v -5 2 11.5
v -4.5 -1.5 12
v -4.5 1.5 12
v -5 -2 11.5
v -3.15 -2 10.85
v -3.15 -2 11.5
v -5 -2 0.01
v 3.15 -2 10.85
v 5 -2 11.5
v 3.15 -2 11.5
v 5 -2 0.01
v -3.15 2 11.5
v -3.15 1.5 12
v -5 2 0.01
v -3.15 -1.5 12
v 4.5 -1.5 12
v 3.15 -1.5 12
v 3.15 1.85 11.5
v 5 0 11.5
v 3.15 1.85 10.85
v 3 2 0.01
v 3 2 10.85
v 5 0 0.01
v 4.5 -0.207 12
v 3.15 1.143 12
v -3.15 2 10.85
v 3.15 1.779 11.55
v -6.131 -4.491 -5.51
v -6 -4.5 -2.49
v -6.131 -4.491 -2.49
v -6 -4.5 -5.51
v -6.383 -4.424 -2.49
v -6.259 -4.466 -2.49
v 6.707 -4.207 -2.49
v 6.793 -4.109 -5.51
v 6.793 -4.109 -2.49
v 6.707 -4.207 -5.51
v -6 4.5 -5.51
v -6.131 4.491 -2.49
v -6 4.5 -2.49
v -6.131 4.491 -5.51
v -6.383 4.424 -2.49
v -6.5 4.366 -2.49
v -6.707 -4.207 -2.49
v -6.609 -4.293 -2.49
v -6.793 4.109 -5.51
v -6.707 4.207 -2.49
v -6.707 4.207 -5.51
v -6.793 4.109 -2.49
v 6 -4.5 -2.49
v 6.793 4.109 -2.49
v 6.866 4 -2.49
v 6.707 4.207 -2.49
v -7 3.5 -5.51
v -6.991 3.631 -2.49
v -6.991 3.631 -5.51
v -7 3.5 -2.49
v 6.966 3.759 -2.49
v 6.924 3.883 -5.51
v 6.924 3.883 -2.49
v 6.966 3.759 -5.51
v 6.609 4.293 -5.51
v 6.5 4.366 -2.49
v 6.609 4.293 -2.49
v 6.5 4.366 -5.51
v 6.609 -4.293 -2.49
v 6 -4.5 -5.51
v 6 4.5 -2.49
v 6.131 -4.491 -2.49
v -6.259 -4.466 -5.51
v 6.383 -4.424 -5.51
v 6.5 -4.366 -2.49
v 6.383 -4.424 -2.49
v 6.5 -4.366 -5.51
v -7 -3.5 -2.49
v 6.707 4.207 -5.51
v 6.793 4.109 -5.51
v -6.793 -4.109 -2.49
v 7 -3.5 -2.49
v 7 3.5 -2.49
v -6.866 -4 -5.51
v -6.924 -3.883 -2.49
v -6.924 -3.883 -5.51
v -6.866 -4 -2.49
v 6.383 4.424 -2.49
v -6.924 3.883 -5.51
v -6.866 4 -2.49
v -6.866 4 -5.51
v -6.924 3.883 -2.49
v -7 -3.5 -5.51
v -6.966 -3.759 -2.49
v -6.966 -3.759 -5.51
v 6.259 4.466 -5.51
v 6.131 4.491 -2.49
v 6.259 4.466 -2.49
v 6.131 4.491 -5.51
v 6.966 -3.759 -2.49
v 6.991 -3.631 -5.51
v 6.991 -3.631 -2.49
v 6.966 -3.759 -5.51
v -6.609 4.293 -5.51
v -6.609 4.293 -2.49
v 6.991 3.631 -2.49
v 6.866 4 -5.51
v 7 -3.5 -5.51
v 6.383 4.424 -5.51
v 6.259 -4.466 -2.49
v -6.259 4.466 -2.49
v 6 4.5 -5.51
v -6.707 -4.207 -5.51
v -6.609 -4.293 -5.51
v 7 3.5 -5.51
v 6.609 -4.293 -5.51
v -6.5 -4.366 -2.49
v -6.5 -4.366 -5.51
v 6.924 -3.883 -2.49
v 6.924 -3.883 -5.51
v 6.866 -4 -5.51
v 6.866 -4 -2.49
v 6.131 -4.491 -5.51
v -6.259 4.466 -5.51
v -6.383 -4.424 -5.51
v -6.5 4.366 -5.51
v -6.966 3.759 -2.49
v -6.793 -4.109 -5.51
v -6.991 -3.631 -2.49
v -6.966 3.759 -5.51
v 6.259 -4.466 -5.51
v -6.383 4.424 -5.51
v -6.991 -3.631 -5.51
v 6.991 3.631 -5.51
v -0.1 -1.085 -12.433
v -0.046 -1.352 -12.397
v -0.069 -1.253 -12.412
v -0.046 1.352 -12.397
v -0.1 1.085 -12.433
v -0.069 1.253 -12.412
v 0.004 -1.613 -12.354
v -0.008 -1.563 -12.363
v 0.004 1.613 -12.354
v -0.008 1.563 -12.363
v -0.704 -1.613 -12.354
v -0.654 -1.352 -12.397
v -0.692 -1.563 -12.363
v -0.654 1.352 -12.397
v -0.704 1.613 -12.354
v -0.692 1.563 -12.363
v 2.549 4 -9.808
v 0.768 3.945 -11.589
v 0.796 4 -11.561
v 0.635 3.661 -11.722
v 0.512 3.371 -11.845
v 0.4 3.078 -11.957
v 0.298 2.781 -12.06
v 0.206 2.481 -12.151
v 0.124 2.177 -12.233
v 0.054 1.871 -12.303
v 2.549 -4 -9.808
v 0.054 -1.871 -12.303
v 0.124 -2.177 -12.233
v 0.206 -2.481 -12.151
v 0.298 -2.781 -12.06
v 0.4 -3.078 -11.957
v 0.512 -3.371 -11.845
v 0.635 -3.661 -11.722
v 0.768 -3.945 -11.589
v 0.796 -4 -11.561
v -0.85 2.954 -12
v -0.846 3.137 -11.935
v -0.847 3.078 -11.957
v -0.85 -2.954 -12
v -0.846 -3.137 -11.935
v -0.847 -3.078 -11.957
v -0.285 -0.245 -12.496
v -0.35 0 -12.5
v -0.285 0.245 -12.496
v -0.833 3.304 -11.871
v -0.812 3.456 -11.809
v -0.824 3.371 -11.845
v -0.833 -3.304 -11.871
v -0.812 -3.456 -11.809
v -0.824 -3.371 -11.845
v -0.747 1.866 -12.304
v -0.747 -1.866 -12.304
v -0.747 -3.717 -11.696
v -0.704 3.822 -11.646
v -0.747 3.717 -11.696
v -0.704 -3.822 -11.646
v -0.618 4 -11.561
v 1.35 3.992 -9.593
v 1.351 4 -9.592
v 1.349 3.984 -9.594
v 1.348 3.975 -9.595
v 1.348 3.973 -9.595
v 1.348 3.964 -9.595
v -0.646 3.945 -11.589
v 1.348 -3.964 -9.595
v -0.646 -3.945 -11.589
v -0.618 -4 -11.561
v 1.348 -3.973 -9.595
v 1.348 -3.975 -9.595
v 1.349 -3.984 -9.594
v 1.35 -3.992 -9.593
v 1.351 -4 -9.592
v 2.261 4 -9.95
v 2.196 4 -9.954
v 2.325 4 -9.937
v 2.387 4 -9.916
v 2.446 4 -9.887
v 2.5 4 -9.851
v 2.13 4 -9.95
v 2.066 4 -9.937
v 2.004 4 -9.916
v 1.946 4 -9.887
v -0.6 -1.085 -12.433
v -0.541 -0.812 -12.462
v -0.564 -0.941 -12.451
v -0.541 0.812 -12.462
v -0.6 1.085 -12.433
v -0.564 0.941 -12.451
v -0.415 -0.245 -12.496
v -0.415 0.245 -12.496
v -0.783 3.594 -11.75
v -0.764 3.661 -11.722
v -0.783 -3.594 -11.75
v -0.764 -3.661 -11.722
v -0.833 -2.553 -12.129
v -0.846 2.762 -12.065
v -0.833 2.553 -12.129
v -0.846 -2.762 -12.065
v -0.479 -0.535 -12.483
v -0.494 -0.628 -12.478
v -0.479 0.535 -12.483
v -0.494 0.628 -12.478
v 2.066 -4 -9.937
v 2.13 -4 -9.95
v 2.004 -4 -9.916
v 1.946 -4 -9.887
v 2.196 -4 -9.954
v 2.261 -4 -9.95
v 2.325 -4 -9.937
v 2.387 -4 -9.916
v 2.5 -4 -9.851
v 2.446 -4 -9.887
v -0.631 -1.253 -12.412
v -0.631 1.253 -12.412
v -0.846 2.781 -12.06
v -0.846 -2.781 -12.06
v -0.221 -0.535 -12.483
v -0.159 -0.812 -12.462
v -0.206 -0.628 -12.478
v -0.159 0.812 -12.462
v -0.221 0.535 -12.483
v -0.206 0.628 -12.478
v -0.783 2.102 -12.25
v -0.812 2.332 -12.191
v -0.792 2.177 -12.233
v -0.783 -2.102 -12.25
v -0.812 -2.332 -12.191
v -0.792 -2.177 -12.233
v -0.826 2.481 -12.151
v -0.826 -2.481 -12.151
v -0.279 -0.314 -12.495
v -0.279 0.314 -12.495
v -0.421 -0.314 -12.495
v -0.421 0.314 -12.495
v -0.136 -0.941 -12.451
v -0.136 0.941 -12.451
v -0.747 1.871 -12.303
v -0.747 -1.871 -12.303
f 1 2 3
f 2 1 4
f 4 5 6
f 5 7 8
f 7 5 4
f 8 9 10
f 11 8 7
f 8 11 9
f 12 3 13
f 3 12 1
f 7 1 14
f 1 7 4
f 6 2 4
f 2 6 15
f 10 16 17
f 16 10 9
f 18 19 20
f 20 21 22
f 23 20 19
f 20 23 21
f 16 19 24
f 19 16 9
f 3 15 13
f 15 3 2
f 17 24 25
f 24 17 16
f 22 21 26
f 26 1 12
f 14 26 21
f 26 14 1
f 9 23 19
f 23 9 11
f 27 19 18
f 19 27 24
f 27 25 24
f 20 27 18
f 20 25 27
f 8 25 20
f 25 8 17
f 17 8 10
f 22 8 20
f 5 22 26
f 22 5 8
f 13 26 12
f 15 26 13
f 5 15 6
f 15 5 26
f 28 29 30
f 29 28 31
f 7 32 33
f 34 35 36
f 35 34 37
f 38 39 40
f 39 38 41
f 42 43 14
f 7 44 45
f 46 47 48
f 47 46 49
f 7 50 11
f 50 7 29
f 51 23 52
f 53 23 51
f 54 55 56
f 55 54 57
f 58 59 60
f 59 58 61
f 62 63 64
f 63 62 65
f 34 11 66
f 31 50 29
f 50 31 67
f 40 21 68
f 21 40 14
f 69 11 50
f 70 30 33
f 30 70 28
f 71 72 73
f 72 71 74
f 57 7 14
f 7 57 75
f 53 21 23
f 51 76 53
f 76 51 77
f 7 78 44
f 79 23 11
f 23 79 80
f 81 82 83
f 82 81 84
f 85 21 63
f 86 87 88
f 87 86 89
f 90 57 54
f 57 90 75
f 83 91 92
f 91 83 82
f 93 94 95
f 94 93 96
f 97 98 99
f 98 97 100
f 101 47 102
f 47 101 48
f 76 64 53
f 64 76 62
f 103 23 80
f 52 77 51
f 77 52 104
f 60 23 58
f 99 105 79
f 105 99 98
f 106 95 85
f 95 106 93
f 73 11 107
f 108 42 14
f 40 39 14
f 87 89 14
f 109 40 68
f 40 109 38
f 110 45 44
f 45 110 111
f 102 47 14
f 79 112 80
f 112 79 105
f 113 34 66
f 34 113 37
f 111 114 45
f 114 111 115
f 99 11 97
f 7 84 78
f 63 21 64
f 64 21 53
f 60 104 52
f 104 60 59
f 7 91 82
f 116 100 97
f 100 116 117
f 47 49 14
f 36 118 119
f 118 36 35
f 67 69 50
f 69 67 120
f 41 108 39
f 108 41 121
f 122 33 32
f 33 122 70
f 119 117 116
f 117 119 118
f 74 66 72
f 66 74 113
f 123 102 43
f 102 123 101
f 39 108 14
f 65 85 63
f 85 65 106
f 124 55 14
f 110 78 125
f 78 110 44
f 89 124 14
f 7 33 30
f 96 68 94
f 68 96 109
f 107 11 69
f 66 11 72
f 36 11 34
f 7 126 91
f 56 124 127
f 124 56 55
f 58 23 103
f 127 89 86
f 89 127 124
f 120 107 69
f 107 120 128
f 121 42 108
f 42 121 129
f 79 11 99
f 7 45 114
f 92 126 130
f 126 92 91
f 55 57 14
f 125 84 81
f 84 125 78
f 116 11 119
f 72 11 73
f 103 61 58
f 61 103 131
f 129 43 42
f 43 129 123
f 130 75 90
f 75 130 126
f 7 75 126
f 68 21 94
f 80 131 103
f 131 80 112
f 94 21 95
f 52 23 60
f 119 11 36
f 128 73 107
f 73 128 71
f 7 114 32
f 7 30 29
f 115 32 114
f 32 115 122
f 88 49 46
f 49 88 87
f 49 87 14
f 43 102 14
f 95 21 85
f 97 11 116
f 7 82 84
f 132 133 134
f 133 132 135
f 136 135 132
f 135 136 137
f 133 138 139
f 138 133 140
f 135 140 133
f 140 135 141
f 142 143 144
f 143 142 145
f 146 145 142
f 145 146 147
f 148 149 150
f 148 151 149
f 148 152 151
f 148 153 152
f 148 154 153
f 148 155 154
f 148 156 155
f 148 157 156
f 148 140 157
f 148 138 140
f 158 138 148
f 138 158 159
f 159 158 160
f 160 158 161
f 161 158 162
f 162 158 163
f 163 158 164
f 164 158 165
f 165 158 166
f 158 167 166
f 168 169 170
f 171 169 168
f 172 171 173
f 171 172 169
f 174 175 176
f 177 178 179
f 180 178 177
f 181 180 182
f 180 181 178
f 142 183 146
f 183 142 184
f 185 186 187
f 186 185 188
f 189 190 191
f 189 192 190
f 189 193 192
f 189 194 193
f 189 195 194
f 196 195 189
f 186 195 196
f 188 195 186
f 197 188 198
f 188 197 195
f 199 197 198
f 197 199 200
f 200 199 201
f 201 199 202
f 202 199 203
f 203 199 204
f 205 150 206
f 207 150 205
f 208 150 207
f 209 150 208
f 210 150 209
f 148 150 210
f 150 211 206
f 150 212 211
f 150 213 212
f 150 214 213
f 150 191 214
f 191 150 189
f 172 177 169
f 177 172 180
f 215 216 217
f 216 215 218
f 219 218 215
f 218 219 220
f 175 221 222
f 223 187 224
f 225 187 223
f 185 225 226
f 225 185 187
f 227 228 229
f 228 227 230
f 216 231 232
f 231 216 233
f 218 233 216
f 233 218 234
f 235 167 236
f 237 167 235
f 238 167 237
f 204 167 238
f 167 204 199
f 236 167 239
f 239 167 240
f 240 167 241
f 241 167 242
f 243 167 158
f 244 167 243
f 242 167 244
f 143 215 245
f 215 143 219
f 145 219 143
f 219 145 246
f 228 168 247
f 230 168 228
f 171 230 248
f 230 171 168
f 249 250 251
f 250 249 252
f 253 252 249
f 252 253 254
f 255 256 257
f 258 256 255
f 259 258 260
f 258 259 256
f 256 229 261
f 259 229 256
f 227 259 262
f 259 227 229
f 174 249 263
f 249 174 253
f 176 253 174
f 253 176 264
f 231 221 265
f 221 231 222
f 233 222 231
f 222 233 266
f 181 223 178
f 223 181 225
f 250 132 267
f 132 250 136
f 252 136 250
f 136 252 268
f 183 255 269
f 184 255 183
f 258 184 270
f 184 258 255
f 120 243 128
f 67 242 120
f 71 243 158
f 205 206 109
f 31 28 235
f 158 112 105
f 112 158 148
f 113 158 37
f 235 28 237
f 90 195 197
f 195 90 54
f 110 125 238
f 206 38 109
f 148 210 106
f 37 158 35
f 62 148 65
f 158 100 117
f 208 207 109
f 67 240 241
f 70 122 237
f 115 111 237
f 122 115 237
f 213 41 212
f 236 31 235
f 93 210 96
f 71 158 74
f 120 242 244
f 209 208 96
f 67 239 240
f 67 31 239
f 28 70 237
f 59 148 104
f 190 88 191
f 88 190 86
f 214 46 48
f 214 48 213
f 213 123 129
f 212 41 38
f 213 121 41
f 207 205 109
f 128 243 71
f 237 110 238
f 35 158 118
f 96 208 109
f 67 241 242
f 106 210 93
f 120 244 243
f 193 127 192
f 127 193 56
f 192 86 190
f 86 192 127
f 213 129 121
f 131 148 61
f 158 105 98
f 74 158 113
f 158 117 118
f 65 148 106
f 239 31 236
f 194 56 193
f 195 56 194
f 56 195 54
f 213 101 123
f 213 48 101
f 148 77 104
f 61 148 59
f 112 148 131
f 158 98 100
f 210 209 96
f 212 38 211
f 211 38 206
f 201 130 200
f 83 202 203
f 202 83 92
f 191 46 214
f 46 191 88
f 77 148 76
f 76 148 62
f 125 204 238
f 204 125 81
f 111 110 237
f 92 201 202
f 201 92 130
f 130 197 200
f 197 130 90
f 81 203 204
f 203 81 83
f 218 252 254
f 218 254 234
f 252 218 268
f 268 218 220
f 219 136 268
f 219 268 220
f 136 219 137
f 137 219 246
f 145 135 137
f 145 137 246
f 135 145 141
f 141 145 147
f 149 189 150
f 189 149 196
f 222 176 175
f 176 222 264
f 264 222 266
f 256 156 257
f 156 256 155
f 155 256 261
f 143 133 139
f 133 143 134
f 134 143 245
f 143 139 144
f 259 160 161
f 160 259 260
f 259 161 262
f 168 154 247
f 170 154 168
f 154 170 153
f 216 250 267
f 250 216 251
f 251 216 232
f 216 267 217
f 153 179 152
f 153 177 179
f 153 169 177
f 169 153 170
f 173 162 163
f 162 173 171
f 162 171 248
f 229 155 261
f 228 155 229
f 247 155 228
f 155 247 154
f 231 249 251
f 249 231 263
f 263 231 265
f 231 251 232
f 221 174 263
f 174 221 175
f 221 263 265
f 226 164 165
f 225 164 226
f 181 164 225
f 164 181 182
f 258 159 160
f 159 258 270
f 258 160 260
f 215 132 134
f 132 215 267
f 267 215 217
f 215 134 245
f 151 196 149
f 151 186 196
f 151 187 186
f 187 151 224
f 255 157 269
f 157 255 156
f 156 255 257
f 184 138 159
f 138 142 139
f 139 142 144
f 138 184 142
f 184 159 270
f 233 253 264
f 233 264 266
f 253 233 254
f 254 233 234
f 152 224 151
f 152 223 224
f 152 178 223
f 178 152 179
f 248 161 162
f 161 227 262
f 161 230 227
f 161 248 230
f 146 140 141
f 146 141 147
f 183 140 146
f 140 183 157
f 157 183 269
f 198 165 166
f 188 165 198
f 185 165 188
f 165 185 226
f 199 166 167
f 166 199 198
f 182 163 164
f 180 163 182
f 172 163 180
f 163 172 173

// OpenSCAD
// =====================================================================
//  tip_B45.scad — SP1 tip B45: nail-mimic 45 deg blade, 8 mm edge, R 0.5
//  PROJECT SCRATCH · 05-engineering/cad/tips · units: mm
//  LOADED SENSE +X = plate-first (the 45 deg face faces +X and down); -X = edge-first.
//  Plate 1.0 mm thick (= 2 x R 0.5), crown R 9, edge lowest point z = -12.5.
//  BLADE_MODE = "printed": one-piece PETG print (ON ITS SIDE, model Y vertical,
//               supports under the tang only, 0.10 mm layers);
//               the apex is sanded to R 0.5 and the plan corners to R 1.5.
//  BLADE_MODE = "slot":    carrier only; CA-bond a 1.0 mm nylon/PETG sheet
//               blade (plan-form: 8 x 9 mm, convex R 9 end) onto the 45 deg face.
// =====================================================================
include <tm1_tang_lib.scad>
$fn = TM1_FN;

BLADE_W    = 8.0;        // edge width along Y
BLADE_R    = 0.5;        // edge radius = half plate thickness
ATTACK     = 45;         // plate angle to the scalp plane, deg
DROP       = 7.0;        // band bottom to edge lowest point
BLADE_MODE = "printed";  // "printed" | "slot"
CROSS_HOLE = false;

module tip_B45(w = BLADE_W, r = BLADE_R, attack = ATTACK, drop = DROP,
               mode = BLADE_MODE, cross_hole = CROSS_HOLE) {
    tm1_tip_base(cross_hole);
    tm1_nail_blade(w = w, r = r, attack = attack, drop = drop, mode = mode);
}

tip_B45();
